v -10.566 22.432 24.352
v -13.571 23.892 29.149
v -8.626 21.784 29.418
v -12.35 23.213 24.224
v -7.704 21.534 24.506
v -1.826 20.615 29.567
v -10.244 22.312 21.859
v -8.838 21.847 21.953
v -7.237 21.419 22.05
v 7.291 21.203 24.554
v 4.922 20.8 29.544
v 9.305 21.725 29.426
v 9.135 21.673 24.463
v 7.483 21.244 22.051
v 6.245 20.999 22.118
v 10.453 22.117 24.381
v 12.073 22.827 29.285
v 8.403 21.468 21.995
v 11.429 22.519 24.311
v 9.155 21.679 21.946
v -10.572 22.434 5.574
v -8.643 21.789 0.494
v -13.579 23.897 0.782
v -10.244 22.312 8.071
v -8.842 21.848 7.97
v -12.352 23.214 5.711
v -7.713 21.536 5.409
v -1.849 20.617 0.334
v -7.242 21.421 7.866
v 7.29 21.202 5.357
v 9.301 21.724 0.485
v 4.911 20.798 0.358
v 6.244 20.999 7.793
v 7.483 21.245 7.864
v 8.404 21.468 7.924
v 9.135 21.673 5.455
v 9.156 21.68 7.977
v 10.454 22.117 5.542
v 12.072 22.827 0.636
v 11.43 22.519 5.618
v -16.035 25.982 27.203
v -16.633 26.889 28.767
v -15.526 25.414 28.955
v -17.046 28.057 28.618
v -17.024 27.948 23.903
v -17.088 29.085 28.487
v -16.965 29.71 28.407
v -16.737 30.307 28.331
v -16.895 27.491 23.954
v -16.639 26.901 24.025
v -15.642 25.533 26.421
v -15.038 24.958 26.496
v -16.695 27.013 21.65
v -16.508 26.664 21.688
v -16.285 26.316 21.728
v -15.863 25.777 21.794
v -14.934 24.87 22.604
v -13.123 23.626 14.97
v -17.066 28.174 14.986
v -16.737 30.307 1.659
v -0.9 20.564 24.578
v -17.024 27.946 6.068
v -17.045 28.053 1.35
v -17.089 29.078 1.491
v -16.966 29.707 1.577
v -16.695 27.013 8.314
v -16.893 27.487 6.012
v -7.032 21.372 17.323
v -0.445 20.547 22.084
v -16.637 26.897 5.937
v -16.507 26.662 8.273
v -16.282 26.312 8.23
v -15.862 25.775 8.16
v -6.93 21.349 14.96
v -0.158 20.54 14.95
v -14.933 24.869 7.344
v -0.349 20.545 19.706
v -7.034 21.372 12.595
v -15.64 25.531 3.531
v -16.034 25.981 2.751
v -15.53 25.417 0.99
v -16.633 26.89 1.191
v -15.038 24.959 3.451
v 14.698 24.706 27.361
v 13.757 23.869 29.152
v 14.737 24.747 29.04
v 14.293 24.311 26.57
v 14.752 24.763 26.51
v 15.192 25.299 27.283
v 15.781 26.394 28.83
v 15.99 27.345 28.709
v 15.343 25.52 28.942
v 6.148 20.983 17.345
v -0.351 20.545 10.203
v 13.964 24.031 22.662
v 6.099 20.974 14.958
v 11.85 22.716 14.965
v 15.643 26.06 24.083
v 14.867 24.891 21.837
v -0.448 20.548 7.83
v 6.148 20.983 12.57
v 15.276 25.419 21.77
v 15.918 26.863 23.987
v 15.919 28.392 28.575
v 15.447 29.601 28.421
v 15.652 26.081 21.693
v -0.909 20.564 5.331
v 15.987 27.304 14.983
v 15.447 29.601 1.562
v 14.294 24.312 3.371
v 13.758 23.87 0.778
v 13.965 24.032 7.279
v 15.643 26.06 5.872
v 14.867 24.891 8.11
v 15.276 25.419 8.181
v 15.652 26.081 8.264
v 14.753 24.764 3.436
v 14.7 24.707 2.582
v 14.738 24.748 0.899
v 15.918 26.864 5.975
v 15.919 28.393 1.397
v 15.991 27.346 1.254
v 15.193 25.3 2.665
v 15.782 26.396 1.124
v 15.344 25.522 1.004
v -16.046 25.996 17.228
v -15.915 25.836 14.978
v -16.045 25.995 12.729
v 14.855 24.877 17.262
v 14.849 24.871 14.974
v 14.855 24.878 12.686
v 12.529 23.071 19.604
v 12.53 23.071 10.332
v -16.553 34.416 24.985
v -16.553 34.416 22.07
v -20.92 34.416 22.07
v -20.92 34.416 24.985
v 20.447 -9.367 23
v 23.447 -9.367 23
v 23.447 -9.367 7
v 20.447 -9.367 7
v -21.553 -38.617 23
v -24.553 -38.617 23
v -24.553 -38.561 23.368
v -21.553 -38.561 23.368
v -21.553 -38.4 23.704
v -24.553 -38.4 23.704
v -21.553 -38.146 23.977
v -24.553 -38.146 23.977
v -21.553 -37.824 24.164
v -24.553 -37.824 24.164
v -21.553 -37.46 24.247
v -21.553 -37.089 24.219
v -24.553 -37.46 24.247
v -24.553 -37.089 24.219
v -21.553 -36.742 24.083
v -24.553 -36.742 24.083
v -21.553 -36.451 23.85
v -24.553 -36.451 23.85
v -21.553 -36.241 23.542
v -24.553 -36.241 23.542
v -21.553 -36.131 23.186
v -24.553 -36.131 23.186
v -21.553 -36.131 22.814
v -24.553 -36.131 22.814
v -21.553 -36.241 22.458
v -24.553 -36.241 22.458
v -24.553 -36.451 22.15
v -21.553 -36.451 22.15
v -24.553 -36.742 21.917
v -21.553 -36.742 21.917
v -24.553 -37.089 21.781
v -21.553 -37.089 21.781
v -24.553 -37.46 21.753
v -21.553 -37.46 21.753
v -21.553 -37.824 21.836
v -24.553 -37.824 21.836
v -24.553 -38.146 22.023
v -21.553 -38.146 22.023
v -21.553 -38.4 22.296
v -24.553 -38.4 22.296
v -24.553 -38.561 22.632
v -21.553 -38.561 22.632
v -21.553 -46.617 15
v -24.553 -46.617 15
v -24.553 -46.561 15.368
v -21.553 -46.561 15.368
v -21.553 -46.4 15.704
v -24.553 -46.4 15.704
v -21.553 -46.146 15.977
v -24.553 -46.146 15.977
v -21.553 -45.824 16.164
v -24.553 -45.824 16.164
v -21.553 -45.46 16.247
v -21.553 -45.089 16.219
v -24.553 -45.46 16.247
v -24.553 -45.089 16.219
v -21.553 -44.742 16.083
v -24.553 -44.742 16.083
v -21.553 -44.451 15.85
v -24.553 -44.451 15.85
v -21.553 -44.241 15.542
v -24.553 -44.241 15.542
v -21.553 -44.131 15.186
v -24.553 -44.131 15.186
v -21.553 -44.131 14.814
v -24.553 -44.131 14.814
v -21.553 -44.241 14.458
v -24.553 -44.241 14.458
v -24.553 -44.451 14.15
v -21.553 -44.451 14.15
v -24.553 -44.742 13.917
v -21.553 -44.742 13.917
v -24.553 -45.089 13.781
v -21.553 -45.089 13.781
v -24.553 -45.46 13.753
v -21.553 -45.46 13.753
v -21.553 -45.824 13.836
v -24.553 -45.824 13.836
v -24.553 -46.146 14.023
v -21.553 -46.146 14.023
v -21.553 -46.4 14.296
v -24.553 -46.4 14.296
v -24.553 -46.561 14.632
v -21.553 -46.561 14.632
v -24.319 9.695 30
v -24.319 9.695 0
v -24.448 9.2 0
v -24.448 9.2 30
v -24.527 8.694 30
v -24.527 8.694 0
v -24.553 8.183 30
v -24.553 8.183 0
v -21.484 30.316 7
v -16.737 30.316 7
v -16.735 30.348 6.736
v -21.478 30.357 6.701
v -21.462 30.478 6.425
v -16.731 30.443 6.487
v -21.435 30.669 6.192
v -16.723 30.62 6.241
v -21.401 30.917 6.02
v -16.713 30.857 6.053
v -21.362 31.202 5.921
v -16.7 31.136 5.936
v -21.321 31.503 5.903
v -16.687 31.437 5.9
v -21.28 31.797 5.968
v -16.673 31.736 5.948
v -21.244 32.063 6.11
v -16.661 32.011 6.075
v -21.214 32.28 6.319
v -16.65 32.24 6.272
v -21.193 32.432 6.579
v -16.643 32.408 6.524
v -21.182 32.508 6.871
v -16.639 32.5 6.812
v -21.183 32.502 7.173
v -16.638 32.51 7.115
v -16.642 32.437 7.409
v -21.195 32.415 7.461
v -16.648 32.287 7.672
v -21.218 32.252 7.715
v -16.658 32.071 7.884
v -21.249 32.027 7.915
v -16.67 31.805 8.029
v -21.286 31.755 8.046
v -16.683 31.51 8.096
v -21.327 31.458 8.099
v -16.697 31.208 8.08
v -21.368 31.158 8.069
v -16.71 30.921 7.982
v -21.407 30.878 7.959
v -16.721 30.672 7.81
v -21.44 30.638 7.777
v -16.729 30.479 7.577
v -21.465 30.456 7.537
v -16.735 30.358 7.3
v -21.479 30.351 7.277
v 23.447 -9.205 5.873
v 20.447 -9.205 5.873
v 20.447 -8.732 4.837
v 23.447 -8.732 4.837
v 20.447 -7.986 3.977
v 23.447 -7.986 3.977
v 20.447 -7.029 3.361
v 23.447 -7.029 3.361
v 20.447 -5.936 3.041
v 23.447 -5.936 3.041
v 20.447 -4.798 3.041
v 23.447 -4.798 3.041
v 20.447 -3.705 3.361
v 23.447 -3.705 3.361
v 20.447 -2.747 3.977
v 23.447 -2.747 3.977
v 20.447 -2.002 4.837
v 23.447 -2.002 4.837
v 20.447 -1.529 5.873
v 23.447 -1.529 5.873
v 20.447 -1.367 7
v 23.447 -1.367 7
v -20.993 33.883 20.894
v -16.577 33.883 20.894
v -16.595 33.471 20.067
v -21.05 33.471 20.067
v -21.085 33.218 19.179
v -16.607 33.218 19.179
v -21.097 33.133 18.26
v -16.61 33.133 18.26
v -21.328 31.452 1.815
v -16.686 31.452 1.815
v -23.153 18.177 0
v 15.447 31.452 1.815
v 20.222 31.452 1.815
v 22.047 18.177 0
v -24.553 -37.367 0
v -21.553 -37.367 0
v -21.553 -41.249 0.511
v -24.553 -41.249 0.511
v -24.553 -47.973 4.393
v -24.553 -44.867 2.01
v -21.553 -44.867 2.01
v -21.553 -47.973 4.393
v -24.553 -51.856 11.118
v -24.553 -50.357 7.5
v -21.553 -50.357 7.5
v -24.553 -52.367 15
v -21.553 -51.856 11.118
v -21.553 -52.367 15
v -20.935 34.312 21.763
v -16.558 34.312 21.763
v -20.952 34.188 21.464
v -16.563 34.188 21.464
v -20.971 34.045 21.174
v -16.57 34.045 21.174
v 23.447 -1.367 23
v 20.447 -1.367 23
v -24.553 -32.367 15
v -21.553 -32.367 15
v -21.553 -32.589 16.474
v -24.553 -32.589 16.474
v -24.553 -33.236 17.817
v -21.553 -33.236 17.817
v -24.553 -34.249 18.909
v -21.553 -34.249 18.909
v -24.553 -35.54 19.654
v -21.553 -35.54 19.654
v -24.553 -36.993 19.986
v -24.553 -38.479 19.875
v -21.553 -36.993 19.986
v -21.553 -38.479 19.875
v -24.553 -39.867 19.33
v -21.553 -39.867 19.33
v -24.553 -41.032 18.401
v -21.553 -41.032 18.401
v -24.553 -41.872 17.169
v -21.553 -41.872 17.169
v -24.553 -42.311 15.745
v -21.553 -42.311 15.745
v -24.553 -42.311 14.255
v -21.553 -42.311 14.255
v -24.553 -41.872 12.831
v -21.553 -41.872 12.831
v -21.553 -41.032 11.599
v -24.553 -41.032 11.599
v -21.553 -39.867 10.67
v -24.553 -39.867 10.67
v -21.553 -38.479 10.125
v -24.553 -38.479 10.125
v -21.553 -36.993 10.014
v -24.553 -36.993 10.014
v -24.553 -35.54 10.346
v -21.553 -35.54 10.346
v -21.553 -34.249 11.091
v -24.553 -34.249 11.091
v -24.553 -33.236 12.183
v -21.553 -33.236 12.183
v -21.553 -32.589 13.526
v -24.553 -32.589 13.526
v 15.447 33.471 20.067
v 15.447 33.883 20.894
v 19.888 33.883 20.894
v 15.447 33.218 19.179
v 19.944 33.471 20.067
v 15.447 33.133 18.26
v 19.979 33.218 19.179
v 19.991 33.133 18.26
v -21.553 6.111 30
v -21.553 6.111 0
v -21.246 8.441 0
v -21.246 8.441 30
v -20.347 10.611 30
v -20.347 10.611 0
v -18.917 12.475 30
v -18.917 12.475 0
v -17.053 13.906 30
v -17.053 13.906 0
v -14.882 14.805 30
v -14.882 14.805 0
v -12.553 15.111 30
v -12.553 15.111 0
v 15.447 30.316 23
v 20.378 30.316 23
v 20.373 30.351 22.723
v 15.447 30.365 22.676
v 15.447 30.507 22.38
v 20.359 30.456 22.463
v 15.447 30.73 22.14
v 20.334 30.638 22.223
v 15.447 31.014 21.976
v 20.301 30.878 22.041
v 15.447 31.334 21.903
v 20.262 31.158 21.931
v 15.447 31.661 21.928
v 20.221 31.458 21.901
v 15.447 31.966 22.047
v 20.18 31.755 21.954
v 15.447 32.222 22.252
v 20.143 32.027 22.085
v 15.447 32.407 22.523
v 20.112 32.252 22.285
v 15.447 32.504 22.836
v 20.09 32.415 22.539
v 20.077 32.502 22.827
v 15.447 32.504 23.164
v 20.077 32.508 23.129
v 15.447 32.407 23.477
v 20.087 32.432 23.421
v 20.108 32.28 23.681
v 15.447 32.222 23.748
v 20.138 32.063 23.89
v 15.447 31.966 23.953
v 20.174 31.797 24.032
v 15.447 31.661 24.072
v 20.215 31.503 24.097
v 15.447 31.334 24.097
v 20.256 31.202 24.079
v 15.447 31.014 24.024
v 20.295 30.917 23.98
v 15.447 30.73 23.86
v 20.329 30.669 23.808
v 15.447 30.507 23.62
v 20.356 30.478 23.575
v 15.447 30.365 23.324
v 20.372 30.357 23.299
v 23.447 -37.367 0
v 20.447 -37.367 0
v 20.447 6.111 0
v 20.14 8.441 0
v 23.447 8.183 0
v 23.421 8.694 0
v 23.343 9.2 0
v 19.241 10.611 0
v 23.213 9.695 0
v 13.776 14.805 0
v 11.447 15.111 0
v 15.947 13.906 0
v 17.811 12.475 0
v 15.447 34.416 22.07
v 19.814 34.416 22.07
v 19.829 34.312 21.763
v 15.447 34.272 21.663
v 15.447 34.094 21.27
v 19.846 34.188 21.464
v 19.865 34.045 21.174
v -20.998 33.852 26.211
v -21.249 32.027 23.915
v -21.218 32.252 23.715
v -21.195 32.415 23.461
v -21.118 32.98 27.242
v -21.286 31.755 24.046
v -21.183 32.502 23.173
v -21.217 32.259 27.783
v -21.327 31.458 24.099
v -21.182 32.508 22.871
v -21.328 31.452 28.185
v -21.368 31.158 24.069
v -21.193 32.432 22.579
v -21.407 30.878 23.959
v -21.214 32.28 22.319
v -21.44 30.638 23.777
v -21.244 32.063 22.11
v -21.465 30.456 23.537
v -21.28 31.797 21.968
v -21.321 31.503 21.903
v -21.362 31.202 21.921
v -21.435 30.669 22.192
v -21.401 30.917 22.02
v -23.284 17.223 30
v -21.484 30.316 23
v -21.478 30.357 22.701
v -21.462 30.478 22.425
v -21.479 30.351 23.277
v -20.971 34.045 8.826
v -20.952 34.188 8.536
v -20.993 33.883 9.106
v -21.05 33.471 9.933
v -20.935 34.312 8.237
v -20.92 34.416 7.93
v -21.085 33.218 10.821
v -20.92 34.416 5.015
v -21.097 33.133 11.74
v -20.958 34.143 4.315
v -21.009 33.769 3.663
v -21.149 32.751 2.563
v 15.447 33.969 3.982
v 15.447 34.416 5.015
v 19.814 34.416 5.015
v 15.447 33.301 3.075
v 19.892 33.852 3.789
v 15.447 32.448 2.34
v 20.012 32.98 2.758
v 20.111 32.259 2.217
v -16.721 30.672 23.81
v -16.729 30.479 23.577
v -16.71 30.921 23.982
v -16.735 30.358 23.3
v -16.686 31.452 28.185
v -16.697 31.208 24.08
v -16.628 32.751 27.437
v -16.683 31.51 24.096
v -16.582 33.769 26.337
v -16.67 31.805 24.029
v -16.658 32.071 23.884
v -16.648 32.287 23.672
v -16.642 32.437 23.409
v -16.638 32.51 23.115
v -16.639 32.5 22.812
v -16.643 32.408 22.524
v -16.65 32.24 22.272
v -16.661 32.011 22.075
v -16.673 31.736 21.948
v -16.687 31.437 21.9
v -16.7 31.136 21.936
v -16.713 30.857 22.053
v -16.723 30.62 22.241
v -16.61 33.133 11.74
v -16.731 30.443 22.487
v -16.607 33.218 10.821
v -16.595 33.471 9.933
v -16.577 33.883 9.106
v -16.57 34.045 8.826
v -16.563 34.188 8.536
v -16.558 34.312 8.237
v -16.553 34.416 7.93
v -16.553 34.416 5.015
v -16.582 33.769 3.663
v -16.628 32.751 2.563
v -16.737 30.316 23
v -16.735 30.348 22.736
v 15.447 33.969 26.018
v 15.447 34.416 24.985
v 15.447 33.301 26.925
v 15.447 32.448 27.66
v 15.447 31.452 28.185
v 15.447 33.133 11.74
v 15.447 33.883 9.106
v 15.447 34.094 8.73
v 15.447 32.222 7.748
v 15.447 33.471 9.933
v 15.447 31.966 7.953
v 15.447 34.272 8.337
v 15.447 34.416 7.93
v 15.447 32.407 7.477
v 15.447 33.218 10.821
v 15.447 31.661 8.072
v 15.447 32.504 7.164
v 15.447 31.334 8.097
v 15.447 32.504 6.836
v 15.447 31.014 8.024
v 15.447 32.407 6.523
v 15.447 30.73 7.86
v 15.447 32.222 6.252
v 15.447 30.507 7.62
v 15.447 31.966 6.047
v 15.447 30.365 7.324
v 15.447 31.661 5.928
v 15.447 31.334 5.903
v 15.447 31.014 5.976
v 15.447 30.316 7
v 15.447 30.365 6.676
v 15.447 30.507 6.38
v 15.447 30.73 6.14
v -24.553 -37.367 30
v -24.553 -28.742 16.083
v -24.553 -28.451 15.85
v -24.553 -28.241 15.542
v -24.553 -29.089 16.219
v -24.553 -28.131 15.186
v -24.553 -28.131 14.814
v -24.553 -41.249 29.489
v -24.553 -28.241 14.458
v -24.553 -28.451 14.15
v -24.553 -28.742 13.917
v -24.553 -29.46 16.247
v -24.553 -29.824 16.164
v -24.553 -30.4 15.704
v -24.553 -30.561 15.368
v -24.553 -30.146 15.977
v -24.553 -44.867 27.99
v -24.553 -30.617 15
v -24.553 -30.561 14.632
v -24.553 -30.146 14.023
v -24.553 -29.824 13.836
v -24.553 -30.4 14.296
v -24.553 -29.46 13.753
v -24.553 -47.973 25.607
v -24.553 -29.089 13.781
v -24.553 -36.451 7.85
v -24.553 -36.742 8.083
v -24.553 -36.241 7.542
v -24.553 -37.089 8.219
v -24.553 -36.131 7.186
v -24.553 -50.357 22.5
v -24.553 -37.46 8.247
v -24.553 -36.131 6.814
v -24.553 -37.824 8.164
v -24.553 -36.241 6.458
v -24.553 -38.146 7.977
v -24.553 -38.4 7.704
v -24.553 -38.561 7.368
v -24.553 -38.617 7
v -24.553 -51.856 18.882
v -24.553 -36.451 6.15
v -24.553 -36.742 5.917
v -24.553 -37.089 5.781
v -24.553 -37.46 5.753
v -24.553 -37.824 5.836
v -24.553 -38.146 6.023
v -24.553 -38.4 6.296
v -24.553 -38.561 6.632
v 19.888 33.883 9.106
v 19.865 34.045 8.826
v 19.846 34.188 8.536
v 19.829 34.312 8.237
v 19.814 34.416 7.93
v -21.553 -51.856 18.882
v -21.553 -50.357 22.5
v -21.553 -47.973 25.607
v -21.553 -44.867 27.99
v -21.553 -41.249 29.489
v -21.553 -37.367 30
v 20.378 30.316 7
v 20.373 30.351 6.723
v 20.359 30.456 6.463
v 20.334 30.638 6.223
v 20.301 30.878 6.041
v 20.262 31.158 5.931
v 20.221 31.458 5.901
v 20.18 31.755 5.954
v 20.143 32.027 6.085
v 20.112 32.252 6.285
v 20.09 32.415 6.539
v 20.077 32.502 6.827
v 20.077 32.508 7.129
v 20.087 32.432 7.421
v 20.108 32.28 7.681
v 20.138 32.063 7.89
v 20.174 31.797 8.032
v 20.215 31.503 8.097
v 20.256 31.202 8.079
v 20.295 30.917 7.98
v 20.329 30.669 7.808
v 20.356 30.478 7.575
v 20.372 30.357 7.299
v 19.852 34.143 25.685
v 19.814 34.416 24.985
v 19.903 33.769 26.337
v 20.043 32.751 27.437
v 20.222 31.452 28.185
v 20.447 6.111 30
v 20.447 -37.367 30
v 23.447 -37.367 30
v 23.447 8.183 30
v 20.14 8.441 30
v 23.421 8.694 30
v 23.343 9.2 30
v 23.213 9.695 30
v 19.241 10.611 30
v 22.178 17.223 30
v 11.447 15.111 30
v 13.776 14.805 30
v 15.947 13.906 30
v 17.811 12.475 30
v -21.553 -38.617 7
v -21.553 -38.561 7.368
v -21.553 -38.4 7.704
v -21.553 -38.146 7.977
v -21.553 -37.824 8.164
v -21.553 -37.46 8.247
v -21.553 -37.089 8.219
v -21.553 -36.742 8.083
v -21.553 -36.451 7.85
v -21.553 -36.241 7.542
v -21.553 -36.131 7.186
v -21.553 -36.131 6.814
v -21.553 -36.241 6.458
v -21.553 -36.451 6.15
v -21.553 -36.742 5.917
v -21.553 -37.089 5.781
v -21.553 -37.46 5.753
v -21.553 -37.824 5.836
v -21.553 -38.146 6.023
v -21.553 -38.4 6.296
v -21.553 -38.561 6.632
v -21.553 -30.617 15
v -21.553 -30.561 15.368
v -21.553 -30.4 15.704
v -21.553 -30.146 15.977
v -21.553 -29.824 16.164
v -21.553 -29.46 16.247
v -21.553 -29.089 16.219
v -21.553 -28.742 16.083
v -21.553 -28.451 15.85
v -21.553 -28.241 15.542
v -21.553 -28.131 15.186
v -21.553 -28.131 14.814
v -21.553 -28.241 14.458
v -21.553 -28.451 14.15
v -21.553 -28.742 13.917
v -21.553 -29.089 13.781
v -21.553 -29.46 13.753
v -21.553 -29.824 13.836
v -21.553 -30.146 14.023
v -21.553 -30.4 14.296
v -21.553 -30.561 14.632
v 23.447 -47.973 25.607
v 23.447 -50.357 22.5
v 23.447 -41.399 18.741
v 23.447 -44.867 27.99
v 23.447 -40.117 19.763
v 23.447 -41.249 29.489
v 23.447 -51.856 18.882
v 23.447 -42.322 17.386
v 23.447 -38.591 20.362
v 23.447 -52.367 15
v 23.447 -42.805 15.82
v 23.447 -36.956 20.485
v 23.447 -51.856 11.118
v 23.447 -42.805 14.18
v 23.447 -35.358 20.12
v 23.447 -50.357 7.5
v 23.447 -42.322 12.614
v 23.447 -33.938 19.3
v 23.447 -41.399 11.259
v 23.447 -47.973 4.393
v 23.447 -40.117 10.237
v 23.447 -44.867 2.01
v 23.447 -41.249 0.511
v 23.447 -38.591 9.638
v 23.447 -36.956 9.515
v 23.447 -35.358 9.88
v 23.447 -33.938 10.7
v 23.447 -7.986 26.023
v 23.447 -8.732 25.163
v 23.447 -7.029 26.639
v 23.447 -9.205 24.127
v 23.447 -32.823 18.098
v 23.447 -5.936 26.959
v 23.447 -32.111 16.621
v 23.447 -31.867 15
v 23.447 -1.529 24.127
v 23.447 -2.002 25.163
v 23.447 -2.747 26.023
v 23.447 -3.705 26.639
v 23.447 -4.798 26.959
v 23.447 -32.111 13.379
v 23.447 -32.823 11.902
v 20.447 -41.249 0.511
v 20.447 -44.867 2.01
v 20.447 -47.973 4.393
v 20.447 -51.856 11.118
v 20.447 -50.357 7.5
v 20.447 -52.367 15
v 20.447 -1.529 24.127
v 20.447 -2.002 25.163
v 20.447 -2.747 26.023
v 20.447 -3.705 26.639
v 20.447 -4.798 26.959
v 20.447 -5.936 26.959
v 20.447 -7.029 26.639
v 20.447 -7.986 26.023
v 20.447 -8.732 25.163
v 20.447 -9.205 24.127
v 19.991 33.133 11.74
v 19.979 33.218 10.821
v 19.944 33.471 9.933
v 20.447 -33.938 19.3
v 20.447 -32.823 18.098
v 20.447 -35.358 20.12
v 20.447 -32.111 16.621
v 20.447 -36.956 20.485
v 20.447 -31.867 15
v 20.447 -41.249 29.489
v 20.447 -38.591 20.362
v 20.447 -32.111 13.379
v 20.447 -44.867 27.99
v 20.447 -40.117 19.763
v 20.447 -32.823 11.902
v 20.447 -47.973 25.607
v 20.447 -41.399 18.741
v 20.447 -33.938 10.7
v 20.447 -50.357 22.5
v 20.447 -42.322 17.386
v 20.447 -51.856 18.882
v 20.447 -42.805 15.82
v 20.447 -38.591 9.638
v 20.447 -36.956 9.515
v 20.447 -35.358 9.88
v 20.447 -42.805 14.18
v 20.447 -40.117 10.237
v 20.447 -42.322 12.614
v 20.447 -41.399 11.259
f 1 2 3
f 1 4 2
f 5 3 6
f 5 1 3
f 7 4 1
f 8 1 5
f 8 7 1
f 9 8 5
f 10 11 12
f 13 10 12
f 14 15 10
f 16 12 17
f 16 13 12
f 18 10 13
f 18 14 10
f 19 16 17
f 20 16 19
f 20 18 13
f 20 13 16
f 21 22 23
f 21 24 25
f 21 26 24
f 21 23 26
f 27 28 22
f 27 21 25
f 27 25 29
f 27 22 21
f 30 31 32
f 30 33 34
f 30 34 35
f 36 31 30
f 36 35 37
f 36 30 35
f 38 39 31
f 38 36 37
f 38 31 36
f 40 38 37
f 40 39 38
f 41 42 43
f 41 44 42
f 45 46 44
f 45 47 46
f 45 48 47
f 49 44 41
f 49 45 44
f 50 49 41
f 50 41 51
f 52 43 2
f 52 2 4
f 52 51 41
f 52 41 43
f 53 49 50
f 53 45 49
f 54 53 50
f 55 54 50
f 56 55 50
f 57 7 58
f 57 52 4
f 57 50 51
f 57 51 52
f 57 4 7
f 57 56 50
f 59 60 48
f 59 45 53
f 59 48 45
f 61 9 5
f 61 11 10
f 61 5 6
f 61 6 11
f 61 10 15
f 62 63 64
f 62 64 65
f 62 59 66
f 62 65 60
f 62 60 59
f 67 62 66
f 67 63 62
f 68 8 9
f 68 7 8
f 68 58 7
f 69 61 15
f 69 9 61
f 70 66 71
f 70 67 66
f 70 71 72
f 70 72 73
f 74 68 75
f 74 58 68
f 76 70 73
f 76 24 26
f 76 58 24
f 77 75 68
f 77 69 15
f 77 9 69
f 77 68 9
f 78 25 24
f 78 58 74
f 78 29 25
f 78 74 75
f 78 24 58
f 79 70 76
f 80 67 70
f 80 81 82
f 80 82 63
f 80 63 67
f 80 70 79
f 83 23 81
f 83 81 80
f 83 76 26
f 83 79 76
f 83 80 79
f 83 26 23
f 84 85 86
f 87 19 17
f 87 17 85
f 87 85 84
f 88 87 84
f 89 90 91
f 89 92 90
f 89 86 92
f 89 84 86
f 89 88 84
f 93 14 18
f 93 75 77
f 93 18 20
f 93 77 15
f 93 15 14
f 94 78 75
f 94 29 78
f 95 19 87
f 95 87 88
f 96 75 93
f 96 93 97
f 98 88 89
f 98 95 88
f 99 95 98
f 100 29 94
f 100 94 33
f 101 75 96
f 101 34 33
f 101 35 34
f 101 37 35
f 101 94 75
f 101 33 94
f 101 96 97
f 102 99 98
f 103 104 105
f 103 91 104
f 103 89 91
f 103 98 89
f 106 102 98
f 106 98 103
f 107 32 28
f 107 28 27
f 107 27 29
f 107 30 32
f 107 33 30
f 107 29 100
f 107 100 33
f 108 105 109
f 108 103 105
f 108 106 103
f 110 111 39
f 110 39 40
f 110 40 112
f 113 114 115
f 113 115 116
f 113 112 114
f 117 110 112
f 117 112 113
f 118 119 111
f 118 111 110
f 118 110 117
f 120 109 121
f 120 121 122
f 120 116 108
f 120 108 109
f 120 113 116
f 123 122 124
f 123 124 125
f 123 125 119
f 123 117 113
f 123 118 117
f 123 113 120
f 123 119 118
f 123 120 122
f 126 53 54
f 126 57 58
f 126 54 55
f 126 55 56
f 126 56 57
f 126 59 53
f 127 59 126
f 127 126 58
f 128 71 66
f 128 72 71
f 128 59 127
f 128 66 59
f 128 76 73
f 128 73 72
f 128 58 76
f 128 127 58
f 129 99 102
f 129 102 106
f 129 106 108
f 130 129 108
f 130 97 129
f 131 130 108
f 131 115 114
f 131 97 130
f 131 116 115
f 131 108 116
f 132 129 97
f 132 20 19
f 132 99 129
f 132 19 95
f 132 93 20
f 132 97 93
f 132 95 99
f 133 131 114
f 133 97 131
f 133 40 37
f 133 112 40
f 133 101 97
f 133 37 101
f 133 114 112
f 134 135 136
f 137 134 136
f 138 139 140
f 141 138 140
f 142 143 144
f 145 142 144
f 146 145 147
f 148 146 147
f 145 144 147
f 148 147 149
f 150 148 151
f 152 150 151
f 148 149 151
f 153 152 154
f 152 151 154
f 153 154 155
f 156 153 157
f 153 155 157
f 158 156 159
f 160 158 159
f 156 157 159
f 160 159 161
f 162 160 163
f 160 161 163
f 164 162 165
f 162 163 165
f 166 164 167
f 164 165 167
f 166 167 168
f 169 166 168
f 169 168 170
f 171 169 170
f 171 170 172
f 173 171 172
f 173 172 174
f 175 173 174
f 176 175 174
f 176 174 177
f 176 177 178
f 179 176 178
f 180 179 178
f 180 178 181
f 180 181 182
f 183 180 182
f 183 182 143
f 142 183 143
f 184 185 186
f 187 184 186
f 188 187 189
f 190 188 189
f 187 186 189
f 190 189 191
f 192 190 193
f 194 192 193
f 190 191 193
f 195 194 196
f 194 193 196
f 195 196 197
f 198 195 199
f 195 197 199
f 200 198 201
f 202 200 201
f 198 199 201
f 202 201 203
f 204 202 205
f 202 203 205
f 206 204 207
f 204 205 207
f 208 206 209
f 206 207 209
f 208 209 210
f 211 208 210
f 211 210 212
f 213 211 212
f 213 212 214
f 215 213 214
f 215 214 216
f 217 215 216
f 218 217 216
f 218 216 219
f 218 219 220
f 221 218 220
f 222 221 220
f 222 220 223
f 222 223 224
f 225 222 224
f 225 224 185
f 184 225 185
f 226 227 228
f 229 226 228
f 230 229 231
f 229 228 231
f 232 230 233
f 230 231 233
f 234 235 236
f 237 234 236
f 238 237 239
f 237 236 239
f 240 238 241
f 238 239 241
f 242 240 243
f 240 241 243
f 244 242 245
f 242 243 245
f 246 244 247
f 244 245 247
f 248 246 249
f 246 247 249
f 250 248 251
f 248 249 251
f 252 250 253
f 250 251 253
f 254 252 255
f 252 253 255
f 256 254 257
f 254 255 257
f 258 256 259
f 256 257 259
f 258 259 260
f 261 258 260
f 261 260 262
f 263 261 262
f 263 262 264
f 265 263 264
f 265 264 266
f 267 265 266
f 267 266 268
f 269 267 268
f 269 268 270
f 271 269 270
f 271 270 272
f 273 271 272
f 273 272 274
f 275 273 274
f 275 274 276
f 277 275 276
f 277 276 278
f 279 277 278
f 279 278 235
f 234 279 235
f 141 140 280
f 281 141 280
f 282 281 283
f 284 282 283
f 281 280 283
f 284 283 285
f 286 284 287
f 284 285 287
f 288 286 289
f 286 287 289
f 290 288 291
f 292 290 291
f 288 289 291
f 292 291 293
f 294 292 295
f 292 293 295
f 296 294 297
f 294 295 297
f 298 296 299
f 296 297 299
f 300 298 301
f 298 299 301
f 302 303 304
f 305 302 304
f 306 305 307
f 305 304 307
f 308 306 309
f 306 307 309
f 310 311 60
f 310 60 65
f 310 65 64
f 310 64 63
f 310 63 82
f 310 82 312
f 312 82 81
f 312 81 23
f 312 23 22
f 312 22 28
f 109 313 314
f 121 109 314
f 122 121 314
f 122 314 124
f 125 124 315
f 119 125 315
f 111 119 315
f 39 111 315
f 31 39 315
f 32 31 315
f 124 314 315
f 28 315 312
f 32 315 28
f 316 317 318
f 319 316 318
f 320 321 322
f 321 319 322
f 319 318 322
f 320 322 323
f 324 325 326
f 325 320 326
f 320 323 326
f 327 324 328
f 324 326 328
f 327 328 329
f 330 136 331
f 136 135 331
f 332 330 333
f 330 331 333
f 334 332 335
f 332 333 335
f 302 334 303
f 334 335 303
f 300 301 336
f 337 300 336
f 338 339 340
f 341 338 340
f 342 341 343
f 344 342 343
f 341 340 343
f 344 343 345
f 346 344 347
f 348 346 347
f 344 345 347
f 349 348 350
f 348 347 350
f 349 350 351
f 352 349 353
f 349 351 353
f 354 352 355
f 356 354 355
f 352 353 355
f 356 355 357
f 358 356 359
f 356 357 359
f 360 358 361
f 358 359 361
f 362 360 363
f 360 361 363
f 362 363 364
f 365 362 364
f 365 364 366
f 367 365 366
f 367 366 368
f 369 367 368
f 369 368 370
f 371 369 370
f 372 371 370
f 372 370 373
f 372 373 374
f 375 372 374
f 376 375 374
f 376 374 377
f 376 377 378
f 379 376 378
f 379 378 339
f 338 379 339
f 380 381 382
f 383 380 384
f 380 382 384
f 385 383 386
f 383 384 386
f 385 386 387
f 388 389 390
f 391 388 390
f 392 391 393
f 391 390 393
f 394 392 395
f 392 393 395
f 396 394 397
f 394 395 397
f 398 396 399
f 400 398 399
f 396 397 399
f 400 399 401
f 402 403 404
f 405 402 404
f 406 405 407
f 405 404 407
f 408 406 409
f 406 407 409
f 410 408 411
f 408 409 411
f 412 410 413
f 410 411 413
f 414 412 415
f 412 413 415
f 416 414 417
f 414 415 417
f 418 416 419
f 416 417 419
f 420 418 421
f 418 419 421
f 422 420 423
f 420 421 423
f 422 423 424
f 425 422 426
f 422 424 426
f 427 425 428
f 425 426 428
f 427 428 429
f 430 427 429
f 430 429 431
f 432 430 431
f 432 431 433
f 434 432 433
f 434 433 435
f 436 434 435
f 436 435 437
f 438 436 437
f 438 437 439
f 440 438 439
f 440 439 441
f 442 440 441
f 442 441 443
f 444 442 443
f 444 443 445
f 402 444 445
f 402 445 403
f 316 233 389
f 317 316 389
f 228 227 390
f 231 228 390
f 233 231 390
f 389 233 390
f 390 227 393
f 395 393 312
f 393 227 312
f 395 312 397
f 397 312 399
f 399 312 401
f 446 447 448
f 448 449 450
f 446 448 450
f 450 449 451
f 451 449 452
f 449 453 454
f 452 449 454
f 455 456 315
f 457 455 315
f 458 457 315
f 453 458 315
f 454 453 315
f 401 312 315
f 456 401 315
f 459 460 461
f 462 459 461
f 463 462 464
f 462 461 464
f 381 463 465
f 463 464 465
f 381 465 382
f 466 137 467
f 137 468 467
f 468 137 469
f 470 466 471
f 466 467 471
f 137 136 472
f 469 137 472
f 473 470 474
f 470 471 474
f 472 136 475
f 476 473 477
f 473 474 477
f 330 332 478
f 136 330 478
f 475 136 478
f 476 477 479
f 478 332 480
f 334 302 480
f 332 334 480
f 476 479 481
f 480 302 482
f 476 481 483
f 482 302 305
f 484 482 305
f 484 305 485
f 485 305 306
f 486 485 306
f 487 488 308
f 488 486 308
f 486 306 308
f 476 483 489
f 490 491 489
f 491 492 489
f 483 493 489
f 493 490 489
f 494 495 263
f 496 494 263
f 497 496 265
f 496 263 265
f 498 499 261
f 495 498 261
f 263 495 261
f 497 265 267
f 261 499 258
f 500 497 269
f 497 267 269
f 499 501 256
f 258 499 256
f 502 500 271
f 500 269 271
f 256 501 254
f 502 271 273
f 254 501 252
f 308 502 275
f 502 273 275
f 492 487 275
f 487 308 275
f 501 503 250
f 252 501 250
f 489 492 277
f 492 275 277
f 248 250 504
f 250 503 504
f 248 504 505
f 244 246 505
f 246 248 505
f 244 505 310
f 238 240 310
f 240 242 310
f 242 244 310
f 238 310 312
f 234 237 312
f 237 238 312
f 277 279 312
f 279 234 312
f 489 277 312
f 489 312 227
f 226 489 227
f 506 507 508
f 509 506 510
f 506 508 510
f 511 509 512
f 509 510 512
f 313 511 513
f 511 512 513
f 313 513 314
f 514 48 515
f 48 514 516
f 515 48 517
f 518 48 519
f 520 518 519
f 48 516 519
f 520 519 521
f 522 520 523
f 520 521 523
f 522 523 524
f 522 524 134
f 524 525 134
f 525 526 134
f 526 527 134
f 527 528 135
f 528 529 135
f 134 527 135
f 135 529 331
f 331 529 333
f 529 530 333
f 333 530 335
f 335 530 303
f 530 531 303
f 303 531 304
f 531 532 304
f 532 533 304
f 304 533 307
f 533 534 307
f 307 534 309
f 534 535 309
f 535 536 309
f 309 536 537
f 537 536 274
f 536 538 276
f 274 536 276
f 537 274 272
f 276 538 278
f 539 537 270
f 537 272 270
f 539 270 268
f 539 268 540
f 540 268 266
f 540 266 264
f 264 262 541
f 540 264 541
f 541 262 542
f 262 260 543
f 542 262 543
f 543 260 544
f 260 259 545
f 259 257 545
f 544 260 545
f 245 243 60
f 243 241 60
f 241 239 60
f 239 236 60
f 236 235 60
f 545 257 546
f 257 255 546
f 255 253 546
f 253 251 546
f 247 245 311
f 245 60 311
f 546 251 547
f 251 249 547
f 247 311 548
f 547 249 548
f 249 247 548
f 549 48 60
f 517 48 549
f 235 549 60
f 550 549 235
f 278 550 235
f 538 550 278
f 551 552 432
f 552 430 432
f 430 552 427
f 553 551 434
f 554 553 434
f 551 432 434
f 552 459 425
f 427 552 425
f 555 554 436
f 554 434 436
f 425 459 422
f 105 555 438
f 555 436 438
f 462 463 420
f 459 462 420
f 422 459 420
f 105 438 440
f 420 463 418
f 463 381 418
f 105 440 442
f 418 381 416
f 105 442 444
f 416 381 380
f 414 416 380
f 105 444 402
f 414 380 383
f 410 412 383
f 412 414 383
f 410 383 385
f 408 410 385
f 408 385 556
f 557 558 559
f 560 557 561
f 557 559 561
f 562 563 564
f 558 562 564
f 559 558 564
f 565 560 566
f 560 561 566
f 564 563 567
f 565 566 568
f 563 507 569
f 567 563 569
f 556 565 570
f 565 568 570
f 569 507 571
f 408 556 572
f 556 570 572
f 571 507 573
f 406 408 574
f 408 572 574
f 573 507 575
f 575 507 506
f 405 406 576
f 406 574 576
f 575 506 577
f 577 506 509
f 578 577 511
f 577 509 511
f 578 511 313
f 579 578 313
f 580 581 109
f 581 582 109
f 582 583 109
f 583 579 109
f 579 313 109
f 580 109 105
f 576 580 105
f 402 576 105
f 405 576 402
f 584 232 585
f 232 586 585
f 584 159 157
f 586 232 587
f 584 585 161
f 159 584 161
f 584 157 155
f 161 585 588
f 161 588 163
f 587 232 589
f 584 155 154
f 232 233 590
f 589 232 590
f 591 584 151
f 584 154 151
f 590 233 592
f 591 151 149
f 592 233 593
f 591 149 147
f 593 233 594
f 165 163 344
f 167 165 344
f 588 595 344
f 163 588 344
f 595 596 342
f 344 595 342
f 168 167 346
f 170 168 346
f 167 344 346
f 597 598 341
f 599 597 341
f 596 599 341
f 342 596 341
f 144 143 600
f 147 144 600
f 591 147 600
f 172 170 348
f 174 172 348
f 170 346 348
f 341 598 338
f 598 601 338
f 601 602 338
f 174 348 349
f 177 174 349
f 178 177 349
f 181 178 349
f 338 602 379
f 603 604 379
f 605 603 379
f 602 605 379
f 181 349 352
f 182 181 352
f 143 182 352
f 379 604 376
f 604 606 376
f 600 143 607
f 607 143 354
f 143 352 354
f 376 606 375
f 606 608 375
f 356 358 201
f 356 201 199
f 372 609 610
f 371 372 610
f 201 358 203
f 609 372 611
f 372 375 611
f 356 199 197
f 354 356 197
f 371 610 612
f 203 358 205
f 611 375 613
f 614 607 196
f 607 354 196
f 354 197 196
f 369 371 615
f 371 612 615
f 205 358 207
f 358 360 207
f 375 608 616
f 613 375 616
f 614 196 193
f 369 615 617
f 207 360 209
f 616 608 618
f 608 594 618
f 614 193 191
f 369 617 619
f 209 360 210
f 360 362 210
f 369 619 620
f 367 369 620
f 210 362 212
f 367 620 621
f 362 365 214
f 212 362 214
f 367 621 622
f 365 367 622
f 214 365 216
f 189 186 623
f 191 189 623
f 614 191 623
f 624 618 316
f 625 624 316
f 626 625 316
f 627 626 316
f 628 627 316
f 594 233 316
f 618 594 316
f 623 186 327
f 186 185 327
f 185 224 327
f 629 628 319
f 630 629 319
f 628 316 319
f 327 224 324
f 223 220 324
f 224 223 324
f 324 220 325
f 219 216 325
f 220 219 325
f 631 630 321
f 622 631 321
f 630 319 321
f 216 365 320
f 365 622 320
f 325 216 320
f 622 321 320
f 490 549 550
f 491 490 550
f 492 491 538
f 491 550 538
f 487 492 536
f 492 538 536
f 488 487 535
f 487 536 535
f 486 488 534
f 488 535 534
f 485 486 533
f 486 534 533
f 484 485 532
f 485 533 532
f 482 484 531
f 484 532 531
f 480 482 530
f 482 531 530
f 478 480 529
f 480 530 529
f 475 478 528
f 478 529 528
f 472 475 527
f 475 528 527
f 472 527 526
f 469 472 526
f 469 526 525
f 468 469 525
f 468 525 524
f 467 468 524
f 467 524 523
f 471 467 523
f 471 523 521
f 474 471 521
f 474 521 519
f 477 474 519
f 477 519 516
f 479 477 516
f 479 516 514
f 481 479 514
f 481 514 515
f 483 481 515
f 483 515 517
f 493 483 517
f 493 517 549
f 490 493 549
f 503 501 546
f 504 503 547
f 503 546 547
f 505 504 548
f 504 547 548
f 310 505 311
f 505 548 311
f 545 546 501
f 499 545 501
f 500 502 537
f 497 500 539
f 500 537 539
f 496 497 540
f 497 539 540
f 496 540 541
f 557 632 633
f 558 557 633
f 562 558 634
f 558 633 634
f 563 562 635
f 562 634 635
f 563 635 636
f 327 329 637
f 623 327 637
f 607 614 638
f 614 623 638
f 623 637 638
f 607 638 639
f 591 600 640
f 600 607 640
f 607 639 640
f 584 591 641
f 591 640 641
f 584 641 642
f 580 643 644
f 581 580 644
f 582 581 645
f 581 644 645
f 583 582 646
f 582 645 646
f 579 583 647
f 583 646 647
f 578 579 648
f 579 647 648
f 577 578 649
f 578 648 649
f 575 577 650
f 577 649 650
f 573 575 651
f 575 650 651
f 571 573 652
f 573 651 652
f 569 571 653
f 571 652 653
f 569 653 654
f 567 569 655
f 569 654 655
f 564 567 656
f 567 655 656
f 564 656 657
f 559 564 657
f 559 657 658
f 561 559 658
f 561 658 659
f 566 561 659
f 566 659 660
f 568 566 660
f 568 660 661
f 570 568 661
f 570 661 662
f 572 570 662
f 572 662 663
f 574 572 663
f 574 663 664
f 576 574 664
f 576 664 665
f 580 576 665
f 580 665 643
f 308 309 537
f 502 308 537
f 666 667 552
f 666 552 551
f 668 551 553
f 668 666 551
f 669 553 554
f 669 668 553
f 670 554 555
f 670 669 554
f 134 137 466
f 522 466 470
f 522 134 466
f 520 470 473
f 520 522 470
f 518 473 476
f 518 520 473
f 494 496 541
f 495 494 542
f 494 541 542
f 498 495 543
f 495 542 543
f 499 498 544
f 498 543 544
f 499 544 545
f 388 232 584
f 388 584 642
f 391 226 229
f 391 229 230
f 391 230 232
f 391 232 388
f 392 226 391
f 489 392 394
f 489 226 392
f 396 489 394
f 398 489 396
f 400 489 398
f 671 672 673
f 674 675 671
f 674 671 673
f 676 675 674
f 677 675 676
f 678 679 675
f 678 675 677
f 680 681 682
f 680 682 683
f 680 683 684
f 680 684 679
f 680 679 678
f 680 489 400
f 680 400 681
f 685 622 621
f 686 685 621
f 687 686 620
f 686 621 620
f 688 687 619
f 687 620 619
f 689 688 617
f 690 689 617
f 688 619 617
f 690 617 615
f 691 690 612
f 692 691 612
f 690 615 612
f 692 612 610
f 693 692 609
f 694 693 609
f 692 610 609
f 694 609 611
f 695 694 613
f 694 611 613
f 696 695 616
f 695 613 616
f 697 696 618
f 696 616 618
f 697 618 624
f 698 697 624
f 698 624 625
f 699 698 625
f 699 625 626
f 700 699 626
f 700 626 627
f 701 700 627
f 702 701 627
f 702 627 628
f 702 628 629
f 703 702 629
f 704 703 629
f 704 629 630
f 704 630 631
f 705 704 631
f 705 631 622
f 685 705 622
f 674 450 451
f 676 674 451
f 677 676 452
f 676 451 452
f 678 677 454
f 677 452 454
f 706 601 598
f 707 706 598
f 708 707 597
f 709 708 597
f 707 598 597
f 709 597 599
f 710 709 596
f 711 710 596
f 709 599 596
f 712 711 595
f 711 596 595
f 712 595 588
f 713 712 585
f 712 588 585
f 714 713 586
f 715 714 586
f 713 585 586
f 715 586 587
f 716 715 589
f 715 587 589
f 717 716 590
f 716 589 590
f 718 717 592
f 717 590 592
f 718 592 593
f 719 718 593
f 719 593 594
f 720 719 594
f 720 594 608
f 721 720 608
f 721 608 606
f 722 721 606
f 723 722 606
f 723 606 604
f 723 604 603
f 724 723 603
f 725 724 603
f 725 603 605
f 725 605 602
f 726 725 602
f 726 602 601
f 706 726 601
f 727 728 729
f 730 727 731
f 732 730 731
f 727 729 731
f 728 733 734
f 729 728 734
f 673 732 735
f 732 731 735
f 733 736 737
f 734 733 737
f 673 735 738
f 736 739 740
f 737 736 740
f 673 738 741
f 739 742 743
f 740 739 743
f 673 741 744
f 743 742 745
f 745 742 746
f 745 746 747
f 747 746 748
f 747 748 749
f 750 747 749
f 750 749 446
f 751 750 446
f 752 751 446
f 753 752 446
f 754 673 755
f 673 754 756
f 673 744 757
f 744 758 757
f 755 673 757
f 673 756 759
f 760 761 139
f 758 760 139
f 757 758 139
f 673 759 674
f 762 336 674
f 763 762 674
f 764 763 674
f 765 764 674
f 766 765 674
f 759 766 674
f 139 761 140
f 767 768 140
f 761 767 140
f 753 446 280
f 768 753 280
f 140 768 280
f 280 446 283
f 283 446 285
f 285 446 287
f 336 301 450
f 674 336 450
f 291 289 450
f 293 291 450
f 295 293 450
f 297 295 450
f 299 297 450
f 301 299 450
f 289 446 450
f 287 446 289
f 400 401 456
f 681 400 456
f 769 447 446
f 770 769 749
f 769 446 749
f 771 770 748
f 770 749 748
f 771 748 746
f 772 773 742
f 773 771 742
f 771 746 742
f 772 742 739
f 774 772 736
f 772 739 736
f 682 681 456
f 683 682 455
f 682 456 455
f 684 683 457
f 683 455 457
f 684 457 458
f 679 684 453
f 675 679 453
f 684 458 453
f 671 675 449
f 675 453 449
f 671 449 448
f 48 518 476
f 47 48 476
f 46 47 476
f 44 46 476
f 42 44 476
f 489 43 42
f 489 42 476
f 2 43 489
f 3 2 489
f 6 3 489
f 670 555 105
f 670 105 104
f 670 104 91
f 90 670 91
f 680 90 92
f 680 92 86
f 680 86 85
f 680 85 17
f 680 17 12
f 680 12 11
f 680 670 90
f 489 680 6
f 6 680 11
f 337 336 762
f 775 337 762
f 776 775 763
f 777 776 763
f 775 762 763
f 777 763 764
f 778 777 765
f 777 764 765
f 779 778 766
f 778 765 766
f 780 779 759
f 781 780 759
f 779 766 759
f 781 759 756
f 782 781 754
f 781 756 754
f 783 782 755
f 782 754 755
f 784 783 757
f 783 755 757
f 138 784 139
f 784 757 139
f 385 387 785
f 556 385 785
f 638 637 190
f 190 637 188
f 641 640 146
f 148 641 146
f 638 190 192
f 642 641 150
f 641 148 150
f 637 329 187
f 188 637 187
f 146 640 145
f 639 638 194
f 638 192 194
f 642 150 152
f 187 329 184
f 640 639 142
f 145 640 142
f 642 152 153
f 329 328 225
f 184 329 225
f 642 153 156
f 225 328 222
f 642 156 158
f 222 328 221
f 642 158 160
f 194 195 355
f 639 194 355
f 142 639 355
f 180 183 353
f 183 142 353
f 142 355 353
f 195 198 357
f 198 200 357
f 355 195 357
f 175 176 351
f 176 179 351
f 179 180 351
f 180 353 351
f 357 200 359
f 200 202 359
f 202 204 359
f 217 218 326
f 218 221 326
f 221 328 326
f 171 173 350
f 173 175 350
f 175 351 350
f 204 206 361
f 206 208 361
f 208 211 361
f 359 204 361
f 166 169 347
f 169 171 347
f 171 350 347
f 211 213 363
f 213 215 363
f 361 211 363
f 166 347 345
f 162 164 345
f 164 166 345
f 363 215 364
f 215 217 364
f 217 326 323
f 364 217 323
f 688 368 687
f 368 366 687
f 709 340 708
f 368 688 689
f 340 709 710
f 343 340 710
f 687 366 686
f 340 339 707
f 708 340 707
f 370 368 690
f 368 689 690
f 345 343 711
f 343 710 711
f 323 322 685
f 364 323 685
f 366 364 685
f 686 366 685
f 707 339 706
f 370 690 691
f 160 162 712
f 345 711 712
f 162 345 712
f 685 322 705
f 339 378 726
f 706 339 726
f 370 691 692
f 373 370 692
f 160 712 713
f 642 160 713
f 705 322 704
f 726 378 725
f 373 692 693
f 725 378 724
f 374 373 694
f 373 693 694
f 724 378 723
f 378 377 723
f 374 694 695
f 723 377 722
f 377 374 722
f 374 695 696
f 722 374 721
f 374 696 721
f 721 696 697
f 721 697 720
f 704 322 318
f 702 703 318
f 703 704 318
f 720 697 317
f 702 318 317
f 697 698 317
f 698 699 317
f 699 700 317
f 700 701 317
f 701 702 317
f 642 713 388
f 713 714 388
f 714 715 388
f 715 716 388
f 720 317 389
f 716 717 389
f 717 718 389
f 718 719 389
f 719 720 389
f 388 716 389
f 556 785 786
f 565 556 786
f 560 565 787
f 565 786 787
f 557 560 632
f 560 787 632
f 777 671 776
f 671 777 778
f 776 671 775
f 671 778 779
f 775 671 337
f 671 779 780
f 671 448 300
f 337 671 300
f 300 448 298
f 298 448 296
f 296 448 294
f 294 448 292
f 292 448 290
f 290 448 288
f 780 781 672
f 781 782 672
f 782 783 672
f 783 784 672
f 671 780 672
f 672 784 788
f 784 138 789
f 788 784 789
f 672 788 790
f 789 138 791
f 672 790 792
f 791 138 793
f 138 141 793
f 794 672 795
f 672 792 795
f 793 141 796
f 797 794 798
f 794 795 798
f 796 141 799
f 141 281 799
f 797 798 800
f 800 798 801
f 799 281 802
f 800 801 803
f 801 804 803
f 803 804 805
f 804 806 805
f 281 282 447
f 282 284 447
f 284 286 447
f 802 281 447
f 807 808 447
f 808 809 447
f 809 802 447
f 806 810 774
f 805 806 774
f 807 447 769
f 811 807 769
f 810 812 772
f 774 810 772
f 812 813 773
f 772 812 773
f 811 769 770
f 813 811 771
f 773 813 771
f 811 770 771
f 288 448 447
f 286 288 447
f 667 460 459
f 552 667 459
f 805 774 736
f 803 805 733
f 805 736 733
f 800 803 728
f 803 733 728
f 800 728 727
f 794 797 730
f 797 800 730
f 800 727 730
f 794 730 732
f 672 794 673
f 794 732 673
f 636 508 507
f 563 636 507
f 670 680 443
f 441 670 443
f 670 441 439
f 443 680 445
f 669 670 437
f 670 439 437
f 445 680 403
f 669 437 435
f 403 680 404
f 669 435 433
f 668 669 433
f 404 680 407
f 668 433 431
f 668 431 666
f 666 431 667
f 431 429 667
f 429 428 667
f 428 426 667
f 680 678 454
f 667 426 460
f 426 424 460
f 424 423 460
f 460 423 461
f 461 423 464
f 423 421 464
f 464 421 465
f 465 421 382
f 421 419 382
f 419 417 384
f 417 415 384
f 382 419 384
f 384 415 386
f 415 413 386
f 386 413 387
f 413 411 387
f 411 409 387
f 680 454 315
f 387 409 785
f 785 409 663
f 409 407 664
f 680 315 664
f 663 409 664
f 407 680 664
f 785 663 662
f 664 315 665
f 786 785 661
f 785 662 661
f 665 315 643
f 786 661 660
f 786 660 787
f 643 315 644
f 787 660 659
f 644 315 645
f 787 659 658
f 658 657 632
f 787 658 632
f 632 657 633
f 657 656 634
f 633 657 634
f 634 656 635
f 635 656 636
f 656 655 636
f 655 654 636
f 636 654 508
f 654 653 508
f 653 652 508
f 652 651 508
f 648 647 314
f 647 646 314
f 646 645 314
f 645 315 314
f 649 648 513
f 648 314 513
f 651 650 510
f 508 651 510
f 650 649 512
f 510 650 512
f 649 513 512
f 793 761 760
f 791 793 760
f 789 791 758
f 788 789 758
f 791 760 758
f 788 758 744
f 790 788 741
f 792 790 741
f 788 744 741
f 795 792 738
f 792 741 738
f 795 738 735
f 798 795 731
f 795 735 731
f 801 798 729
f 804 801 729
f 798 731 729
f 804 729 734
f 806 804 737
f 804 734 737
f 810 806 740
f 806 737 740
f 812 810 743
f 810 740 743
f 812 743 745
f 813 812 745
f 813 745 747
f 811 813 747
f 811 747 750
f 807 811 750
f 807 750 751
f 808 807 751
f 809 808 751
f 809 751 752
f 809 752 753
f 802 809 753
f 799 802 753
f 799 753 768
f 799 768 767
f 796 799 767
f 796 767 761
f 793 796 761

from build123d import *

# Parameters (mm, degrees)
EXTRUDE_1_DEPTH      = 30
SKETCH_3_R           = 5
CUT_EXTRUDE_5_DEPTH  = 56
CUT_EXTRUDE_12_DEPTH = 51
SKETCH_3_4_R         = 1.1
CUT_EXTRUDE_7_DEPTH  = 56
SKETCH_6_R           = 1.25
CUT_EXTRUDE_9_DEPTH  = 22
SKETCH_5_R           = 5.5
CUT_EXTRUDE_13_DEPTH = 10


with BuildPart() as part:
    # Эскиз1 → Бобышка-Вытянуть1 (new body)
    with BuildSketch(Plane.XY):
        with BuildLine():
            ThreePointArc((23.447094189, 8.182803621), (23.388195094, 8.947997617), (23.212885448, 9.69516392))
            Line((23.212885448, 9.69516392), (19.814400159, 34.41595773))
            Line((19.814400159, 34.41595773), (15.447094189, 34.41595773))
            Line((15.447094189, 34.41595773), (15.447094189, 29.601114652))
            add(Edge.make_bspline(
                [(-16.737207413, 30.306768931), (-21.154797026, 21.000420448), (-0.15838441, 20.540065316), (20.838028206, 20.079710184), (15.447094189, 29.601114652)],
                knots=[2.948852751, 2.948852751, 2.948852751, 4.755403061, 4.755403061, 6.56195337, 6.56195337, 6.56195337], degree=2, weights=[1, 0.619041122, 1, 0.619041122, 1]))
            Line((-16.737207413, 30.306768931), (-16.552905811, 34.41595773))
            Line((-16.552905811, 34.41595773), (-20.92021178, 34.41595773))
            Line((-20.92021178, 34.41595773), (-24.31869707, 9.69516392))
            ThreePointArc((-24.31869707, 9.69516392), (-24.494006715, 8.947997617), (-24.552905811, 8.182803621))
            Line((-24.552905811, 8.182803621), (-24.552905811, -52.36689041))
            Line((-24.552905811, -52.36689041), (-21.552905811, -52.36689041))
            Line((-21.552905811, -52.36689041), (-21.552905811, 5.955043958))
            Line((-21.552905811, 5.955043958), (-21.552905811, 6.111376347))
            ThreePointArc((-21.552905811, 6.111376347), (-18.916866841, 12.475337378), (-12.552905811, 15.111376347))
            Line((-12.552905811, 15.111376347), (11.447094189, 15.111376347))
            ThreePointArc((11.447094189, 15.111376347), (17.81105522, 12.475337378), (20.447094189, 6.111376347))
            Line((20.447094189, 6.111376347), (20.447094189, 5.955043958))
            Line((20.447094189, 5.955043958), (20.447094189, -52.36689041))
            Line((20.447094189, -52.36689041), (23.447094189, -52.36689041))
            Line((23.447094189, -52.36689041), (23.447094189, 8.182803621))
        make_face()
    extrude(amount=EXTRUDE_1_DEPTH)

    # Эскиз3 → Вырез-Вытянуть5 (cut)
    with BuildSketch(Plane(origin=(23.447094189, 0, 0), x_dir=(0, 0, -1), z_dir=(1, 0, 0))):
        with Locations(Location((-15, -37.36689041, 0), (0, 0, 90))):
            Circle(SKETCH_3_R)
        with BuildLine():
            ThreePointArc((-15, -52.36689041), (-25.606601718, -47.973492128), (-30, -37.36689041))
            Line((-30, -37.36689041), (-30, -52.36689041))
            Line((-30, -52.36689041), (-15, -52.36689041))
        make_face()
        with BuildLine():
            ThreePointArc((0, -37.36689041), (-4.393398282, -47.973492128), (-15, -52.36689041))
            Line((-15, -52.36689041), (0, -52.36689041))
            Line((0, -52.36689041), (0, -37.36689041))
        make_face()
    extrude(amount=-CUT_EXTRUDE_5_DEPTH, mode=Mode.SUBTRACT)

    # Эскиз2 → Вырез-Вытянуть12 (cut)
    with BuildSketch(Plane(origin=(23.447094189, 0, 0), x_dir=(0, 0, -1), z_dir=(1, 0, 0))):
        with BuildLine():
            ThreePointArc((-23.527450038, 34.63310959), (-26.347454746, 33.761980313), (-28.184823989, 31.45213897))
            Line((-28.184823989, 31.45213897), (-30.35352757, 14.45213897))
            Line((-30.35352757, 14.45213897), (-30.35352757, 34.95213897))
            Line((-30.35352757, 34.95213897), (-23.527450038, 34.63310959))
        make_face()
        with BuildLine():
            Line((-18.259623162, 33.13310959), (-15, 33.13310959))
            Line((-15, 33.13310959), (-15, 34.63310959))
            Line((-15, 34.63310959), (-23.527450038, 34.63310959))
            ThreePointArc((-23.527450038, 34.63310959), (-22.158143644, 34.441955605), (-20.8935366, 33.88310959))
            ThreePointArc((-20.8935366, 33.88310959), (-19.628929556, 33.324263575), (-18.259623162, 33.13310959))
        make_face()
        with BuildLine():
            Line((-15, 34.63310959), (-15, 33.13310959))
            Line((-15, 33.13310959), (-11.740376838, 33.13310959))
            ThreePointArc((-11.740376838, 33.13310959), (-10.371070444, 33.324263575), (-9.1064634, 33.88310959))
            ThreePointArc((-9.1064634, 33.88310959), (-7.841856356, 34.441955605), (-6.472549962, 34.63310959))
            Line((-6.472549962, 34.63310959), (-15, 34.63310959))
        make_face()
        with BuildLine():
            Line((0.509110945, 34.95310959), (-6.472549962, 34.63310959))
            ThreePointArc((-6.472549962, 34.63310959), (-3.652545254, 33.761980313), (-1.815176011, 31.45213897))
            Line((-1.815176011, 31.45213897), (0.509110945, 14.45310959))
            Line((0.509110945, 14.45310959), (0.509110945, 34.95310959))
        make_face()
    extrude(amount=-CUT_EXTRUDE_12_DEPTH, mode=Mode.SUBTRACT)

    # Эскиз3<4> → Вырез-Вытянуть7 (cut)
    with BuildSketch(Plane(origin=(23.447094189, 0, 0), x_dir=(0, 0, -1), z_dir=(1, 0, 0))):
        with Locations(Location((-23, 31.41595774, 0), (0, 0, 270))):
            Circle(SKETCH_3_4_R)
        with Locations(Location((-7, 31.41595774, 0), (0, 0, 270))):
            Circle(SKETCH_3_4_R)
    extrude(amount=-CUT_EXTRUDE_7_DEPTH, mode=Mode.SUBTRACT)

    # Эскиз6 → Вырез-Вытянуть9 (cut)
    with BuildSketch(Plane.ZY.offset(24.552905811)):
        with Locations(Location((15, -29.36689041, 0), (0, 0, 270))):
            Circle(SKETCH_6_R)
        with Locations(Location((7, -37.36689041, 0), (0, 0, 270))):
            Circle(SKETCH_6_R)
        with Locations(Location((23, -37.36689041, 0), (0, 0, 270))):
            Circle(SKETCH_6_R)
        with Locations(Location((15, -45.36689041, 0), (0, 0, 270))):
            Circle(SKETCH_6_R)
    extrude(amount=-CUT_EXTRUDE_9_DEPTH, mode=Mode.SUBTRACT)

    # Эскиз5 → Вырез-Вытянуть13 (cut)
    with BuildSketch(Plane(origin=(23.447094189, 0, 0), x_dir=(0, 0, -1), z_dir=(1, 0, 0))):
        with Locations(Location((-15, -37.36689041, 0), (0, 0, 90))):
            Circle(SKETCH_5_R)
        with BuildLine():
            Line((-15, -1.36689041), (-23, -1.36689041))
            ThreePointArc((-23, -1.36689041), (-27, -5.36689041), (-23, -9.36689041))
            Line((-23, -9.36689041), (-7, -9.36689041))
            ThreePointArc((-7, -9.36689041), (-3, -5.36689041), (-7, -1.36689041))
            Line((-7, -1.36689041), (-15, -1.36689041))
        make_face()
    extrude(amount=-CUT_EXTRUDE_13_DEPTH, mode=Mode.SUBTRACT)


solid = part.part
